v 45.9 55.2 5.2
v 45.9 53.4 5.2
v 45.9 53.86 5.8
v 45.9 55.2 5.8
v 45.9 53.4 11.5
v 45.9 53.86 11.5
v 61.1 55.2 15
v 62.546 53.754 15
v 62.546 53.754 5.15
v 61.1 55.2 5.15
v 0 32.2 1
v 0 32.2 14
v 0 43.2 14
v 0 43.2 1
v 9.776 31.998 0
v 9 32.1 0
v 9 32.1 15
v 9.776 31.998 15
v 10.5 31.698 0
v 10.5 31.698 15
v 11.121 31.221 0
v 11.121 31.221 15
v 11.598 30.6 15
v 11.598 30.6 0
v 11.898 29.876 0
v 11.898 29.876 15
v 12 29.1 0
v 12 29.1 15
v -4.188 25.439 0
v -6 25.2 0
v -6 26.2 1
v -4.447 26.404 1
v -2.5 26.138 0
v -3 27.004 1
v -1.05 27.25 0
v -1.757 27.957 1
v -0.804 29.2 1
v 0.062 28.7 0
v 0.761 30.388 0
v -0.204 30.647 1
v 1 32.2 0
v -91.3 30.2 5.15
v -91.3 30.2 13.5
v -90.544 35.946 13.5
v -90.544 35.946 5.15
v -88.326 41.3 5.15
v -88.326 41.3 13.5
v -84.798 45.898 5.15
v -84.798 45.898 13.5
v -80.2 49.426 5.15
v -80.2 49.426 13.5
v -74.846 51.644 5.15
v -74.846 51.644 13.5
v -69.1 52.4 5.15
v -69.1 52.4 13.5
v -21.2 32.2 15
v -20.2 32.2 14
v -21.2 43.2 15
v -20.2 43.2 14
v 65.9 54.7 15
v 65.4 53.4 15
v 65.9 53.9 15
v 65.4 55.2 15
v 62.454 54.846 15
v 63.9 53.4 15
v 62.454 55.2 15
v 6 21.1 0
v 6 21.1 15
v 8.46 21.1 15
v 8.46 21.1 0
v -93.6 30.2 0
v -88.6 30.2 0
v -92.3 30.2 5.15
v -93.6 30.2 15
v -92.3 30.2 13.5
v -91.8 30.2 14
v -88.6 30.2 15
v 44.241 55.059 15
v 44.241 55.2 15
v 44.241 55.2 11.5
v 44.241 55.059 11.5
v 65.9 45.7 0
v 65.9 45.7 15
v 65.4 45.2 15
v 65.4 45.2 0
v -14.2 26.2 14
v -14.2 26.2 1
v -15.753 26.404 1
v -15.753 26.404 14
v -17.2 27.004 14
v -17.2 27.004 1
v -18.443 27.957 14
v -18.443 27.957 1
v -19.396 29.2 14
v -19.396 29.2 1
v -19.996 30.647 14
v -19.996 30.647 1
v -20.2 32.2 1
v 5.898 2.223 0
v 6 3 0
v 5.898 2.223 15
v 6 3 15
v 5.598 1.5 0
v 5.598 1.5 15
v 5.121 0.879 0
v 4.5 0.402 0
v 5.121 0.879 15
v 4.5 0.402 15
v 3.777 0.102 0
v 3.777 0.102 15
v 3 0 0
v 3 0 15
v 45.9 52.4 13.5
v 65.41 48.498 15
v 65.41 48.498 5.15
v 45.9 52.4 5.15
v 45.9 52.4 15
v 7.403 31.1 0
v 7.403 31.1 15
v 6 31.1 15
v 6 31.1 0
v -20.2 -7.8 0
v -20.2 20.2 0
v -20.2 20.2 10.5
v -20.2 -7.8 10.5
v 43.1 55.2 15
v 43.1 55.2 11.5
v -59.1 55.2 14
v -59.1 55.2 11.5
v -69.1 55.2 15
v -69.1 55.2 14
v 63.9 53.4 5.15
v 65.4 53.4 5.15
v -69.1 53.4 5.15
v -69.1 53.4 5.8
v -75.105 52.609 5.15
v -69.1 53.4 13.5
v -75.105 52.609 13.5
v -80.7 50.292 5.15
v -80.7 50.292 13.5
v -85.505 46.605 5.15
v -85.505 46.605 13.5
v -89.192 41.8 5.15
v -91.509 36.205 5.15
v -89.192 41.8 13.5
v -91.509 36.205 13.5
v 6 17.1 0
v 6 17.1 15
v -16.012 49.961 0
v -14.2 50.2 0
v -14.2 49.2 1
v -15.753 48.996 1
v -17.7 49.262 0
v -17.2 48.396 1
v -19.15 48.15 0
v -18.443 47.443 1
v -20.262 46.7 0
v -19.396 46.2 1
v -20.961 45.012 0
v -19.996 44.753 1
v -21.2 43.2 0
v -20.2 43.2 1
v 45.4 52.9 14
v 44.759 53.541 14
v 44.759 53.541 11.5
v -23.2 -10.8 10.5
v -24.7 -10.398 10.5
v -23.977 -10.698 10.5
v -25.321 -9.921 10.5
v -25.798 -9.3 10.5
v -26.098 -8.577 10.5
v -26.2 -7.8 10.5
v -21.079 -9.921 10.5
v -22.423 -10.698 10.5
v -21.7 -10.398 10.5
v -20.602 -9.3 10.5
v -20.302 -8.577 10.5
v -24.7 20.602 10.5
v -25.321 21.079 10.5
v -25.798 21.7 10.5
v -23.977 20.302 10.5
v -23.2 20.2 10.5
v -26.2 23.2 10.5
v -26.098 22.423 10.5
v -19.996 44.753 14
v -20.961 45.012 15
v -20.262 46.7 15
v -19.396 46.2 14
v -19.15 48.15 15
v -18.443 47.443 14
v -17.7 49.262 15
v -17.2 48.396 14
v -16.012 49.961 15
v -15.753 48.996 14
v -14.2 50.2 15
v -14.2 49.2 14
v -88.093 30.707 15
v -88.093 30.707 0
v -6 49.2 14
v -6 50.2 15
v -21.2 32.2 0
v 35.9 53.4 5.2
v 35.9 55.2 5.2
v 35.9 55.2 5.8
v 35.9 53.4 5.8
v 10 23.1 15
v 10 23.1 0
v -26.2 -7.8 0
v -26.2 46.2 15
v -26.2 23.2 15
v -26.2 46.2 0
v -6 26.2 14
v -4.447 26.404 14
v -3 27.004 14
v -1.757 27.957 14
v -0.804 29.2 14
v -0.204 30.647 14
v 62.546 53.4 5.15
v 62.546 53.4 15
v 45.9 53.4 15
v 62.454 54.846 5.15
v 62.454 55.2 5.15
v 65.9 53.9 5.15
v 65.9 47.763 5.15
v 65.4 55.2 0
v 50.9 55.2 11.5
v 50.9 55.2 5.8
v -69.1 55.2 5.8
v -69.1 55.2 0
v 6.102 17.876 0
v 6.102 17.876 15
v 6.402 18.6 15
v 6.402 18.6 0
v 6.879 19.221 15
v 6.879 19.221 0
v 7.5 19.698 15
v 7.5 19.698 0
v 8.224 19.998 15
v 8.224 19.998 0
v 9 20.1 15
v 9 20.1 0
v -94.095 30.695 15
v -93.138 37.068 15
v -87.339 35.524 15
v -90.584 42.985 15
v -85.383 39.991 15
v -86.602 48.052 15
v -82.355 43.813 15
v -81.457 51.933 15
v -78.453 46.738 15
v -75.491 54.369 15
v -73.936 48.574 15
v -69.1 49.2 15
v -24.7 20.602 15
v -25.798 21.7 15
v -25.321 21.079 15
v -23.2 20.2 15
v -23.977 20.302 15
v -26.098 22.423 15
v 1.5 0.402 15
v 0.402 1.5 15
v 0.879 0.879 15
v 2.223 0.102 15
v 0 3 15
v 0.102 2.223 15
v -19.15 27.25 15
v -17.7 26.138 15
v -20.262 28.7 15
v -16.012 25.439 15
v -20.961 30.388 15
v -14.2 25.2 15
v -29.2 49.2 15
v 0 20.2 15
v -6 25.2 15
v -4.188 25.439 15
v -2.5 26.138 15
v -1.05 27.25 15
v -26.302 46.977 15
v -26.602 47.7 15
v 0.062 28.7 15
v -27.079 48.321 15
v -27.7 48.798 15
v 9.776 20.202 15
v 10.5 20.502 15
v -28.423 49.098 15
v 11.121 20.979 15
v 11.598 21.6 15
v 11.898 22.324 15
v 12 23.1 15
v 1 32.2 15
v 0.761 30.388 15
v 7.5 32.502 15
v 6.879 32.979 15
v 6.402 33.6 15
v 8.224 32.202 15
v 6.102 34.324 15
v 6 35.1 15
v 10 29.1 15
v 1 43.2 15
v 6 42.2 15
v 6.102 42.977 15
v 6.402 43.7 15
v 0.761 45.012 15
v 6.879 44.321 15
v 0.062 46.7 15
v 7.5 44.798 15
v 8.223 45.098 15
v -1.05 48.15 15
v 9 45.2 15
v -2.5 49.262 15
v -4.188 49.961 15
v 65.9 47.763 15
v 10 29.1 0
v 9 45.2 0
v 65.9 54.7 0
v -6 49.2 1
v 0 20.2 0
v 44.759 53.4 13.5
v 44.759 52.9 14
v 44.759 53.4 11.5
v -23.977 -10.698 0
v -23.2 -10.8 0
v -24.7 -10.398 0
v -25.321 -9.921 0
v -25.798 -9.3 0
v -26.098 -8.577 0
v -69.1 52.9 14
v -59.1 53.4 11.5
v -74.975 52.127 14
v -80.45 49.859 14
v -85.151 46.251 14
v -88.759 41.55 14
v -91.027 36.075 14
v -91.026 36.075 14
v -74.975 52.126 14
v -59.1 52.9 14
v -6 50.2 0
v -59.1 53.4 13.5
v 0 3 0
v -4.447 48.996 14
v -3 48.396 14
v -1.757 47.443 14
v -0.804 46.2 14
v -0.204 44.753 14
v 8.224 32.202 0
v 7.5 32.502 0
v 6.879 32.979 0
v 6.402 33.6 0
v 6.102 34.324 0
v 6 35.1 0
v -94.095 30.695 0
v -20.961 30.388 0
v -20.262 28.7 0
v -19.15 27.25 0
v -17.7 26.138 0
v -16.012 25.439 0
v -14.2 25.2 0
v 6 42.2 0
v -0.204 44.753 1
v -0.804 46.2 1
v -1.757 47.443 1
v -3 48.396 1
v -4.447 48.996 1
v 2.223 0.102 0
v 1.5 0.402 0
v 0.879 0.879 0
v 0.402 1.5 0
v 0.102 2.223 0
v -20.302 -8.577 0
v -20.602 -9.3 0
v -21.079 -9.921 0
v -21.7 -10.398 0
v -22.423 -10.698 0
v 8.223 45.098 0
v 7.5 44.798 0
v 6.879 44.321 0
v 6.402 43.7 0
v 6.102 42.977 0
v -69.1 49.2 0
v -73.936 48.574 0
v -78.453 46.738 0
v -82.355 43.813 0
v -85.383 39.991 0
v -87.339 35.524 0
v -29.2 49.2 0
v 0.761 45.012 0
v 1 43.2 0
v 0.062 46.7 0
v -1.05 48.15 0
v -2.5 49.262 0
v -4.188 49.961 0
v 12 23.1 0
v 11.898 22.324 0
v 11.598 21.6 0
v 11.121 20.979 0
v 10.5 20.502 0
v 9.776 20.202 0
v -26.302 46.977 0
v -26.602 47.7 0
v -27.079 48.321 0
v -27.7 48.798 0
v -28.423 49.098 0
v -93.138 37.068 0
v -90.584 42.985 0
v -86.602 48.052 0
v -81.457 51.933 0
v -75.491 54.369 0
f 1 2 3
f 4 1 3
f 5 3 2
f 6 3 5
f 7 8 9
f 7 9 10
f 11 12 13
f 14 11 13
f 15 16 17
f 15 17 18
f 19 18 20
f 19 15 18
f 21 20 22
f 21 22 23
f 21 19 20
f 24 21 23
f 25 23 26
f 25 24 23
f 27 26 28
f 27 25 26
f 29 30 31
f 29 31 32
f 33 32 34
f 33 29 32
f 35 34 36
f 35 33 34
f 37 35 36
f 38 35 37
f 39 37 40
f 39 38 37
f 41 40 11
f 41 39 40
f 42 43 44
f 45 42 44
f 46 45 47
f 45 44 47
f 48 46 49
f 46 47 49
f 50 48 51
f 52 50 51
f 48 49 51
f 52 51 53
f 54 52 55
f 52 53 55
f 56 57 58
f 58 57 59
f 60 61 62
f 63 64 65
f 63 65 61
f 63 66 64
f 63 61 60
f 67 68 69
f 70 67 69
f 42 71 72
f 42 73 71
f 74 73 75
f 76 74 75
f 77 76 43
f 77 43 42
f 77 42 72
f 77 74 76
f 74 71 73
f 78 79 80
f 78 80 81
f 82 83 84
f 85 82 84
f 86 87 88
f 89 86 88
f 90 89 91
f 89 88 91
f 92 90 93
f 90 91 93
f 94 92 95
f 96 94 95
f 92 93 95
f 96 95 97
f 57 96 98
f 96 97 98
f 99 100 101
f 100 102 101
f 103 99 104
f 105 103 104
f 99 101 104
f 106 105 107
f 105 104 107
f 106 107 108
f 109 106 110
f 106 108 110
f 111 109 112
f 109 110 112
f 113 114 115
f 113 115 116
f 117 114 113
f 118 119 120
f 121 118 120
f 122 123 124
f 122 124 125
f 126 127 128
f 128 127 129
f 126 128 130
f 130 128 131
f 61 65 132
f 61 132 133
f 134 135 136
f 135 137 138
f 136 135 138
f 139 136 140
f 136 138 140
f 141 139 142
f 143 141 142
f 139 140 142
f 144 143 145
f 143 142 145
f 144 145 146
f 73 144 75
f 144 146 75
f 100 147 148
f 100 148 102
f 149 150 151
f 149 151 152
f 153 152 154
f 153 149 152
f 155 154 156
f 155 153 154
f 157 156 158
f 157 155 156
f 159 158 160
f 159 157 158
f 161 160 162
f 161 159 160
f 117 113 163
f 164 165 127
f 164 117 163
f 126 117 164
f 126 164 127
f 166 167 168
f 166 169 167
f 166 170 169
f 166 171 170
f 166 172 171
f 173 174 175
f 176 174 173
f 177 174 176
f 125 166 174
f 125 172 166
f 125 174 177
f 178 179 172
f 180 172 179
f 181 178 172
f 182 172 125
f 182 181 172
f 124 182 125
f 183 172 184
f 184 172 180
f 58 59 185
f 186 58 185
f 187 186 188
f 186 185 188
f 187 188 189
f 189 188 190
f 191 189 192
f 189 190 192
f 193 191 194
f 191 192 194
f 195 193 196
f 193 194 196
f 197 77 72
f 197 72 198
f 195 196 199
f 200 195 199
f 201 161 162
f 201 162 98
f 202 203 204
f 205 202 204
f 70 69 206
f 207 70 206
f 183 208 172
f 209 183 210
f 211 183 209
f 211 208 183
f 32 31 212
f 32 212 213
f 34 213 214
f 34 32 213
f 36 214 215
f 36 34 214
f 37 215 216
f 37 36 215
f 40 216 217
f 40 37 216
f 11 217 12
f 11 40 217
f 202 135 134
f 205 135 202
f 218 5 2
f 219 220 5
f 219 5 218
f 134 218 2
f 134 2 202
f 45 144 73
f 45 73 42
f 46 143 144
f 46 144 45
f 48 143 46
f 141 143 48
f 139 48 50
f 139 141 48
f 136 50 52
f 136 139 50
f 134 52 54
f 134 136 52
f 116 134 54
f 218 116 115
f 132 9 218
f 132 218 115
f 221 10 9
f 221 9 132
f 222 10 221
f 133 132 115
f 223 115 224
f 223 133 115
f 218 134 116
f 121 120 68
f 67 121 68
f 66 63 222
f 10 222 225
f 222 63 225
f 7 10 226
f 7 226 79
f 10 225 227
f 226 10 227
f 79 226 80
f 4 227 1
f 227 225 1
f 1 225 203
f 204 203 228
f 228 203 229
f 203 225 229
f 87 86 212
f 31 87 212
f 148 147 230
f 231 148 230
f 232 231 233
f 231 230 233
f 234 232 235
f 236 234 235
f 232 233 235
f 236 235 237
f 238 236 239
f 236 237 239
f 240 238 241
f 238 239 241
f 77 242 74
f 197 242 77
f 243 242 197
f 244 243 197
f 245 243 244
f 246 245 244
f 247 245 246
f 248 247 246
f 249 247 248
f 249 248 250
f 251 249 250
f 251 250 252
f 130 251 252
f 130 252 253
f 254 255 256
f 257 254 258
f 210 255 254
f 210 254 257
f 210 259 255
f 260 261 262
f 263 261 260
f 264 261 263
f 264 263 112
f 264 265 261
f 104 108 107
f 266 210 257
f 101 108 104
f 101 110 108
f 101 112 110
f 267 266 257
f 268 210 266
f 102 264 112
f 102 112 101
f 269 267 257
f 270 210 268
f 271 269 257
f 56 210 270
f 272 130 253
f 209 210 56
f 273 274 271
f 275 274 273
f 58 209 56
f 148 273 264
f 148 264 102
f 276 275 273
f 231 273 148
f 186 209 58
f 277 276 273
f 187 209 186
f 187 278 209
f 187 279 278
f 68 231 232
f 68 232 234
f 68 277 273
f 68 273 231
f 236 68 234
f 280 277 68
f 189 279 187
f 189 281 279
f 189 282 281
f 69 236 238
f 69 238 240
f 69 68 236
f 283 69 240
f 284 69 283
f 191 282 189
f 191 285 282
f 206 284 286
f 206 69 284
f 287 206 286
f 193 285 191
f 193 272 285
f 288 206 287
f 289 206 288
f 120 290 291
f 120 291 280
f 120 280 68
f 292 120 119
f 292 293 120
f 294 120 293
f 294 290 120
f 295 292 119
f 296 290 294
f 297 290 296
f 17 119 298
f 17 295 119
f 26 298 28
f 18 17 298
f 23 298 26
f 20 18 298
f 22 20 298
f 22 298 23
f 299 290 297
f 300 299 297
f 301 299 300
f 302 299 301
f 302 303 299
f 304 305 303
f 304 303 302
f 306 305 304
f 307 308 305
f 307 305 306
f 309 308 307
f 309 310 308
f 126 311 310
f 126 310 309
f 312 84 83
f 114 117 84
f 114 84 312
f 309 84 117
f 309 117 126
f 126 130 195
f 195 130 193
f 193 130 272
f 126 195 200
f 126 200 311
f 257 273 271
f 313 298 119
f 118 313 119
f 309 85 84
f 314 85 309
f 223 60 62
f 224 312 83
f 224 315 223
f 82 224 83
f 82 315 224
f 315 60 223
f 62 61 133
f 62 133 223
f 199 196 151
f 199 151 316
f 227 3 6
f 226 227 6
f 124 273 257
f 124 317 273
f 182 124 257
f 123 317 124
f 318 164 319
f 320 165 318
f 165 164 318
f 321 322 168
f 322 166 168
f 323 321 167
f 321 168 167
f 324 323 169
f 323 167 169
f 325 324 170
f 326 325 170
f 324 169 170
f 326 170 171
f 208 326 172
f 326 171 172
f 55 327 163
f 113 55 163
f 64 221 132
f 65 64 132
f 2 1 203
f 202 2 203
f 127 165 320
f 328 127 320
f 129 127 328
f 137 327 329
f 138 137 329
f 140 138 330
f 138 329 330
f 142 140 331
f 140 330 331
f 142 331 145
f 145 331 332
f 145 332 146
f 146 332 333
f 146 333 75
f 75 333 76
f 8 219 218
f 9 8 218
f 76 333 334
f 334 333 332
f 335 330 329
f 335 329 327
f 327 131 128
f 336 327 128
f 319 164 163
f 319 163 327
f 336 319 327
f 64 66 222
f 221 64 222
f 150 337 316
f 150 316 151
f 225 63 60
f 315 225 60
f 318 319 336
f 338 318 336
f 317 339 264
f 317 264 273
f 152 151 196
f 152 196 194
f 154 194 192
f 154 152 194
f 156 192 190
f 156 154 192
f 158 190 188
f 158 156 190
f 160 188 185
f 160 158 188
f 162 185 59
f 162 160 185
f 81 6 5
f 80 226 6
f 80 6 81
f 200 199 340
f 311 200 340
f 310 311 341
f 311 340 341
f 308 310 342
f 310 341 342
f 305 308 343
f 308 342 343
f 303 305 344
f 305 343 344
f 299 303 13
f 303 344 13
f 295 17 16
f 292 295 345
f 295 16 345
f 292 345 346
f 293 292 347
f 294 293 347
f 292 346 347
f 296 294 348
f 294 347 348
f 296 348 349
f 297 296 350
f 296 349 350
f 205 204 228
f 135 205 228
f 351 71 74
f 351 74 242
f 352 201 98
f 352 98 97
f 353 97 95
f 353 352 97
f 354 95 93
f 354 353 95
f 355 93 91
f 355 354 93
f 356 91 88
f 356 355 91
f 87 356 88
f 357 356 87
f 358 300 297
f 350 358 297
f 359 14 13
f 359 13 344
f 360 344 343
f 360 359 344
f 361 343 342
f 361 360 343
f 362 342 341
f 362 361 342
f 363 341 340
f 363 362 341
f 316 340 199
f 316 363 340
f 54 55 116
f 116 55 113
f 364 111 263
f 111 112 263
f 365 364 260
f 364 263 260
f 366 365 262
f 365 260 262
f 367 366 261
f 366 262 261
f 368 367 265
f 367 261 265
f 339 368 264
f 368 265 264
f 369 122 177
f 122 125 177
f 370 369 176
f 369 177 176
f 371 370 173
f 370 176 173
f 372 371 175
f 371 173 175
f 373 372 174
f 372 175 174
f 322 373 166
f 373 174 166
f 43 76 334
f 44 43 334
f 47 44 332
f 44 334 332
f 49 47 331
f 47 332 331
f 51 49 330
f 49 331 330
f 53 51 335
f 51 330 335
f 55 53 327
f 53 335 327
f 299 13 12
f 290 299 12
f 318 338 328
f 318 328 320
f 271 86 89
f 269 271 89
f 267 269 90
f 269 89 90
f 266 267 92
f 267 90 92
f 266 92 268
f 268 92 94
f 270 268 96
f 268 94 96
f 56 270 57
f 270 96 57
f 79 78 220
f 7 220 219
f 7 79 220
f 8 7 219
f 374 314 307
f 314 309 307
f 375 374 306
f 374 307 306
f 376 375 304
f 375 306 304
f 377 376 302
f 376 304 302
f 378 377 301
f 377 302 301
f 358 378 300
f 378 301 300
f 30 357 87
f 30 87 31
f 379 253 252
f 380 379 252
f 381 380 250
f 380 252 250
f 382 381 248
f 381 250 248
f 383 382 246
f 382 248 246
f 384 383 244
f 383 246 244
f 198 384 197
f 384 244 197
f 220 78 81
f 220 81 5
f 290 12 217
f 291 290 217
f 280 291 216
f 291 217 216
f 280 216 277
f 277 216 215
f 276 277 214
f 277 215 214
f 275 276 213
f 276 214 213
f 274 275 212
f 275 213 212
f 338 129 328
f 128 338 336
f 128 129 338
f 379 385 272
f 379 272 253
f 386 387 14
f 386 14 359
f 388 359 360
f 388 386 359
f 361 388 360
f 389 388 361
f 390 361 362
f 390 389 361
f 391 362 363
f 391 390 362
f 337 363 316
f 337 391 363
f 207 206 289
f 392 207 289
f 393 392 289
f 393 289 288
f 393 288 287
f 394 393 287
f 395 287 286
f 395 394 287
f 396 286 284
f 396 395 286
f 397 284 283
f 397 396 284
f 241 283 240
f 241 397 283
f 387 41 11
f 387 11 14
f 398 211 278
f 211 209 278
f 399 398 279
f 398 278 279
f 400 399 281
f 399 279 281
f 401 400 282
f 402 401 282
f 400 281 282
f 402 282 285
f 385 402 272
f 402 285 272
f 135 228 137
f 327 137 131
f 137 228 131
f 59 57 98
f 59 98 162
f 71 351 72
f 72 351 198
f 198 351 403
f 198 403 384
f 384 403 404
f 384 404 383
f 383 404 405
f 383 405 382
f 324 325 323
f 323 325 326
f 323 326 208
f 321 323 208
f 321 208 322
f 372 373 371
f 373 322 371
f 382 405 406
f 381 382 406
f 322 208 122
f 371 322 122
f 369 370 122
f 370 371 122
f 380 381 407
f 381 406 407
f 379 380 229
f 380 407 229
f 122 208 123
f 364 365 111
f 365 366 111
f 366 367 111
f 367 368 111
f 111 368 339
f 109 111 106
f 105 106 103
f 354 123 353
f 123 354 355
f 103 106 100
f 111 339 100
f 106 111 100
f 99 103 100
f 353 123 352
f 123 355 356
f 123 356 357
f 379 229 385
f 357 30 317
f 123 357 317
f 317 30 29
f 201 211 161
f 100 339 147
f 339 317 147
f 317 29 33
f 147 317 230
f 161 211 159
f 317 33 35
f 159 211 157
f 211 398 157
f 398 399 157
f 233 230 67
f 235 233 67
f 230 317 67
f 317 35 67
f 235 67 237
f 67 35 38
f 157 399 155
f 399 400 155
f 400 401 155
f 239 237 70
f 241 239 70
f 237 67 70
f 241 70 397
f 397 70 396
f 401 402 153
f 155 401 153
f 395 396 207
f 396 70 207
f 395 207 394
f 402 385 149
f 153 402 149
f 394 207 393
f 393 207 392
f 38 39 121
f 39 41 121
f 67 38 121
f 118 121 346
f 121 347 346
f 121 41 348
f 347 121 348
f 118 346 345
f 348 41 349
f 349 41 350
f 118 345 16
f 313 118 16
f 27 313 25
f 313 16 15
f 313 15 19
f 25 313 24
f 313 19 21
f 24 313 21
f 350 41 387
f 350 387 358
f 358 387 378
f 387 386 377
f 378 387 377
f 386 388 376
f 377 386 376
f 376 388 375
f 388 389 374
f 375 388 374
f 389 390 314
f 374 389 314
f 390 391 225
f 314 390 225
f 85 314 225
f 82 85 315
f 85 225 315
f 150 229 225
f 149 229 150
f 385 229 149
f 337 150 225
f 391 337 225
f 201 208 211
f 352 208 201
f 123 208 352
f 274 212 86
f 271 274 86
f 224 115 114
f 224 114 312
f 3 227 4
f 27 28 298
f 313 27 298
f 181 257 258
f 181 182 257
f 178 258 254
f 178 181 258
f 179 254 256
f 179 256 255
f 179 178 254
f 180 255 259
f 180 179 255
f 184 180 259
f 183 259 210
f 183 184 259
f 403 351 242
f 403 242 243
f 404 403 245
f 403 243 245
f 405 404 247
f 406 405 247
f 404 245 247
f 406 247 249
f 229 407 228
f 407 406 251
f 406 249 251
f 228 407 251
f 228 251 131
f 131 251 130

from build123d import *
from OCP.BRepFilletAPI import BRepFilletAPI_MakeChamfer

# Parameters (mm, degrees)
BOSS_EXTRUDE1_DEPTH = 15
BOSS_EXTRUDE2_DEPTH = 15
SKETCH6_W           = 115
SKETCH6_H           = 1
CUT_EXTRUDE2_DEPTH  = 9.85
CUT_EXTRUDE3_DEPTH  = 9.85
CUT_EXTRUDE4_DEPTH  = 9.85
BOSS_EXTRUDE3_DEPTH = 1
CUT_EXTRUDE5_REACH  = 117.913
SKETCH10_W          = 115
SKETCH10_H          = 5.7
SKETCH13_W          = 20.2
SKETCH13_H          = 23
CUT_EXTRUDE6_DEPTH  = 111.121977825
FILLET1_R           = 6
SKETCH14_W          = 6
SKETCH14_H          = 31
CUT_EXTRUDE7_DEPTH  = 4.5
FILLET2_R           = 3
SKETCH16_W          = 10
SKETCH16_H          = 2.5
CUT_EXTRUDE8_DEPTH  = 1.8
CHAMFER1_SIZE       = 0.5
CHAMFER1_SIZE_2     = 0.637377439
CHAMFER2_SIZE       = 1
CHAMFER3_SIZE       = 5
CHAMFER3_SIZE2      = 1.339745962
CUT_EXTRUDE12_REACH = 112.118
CHAMFER4_SIZE       = 0.2
CHAMFER4_SIZE_2     = 0.141421356
SKETCH25_W          = 6
SKETCH25_H          = 12
BOSS_EXTRUDE6_DEPTH = 15
FILLET4_START       = -1
FILLET4_DEPTH       = 16
FILLET4_2_DEPTH     = 15
CUT_EXTRUDE15_DEPTH = 15
CUT_EXTRUDE16_DEPTH = 9.85
CHAMFER5_SIZE       = 0.5
CHAMFER5_SIZE2      = 0.353553391
CHAMFER6_SIZE       = 0.5
SKETCH29_W          = 10
SKETCH29_H          = 0.6
CUT_EXTRUDE17_DEPTH = 2.8


with BuildPart() as part:
    # Sketch3 → Boss-Extrude1 (new body)
    with BuildSketch(Plane.XY):
        Polygon((0, 0), (0, 20.2), (-20.2, 20.2), (-20.2, -10.8), (-26.2, -10.8), (-26.2, 49.2), (-69.1, 49.2), (-69.1, 55.2), (5.9, 55.2), (65.9, 55.2), (65.9, 45.2), (6, 45.2), (6, 0), align=None)
    extrude(amount=BOSS_EXTRUDE1_DEPTH)

    # Sketch4 → Boss-Extrude2 (add)
    with BuildSketch(Plane.XY.offset(15)):
        with BuildLine():
            Line((-88.1, 30.2), (-94.1, 30.2))
            ThreePointArc((-94.1, 30.2), (-86.77766953, 47.87766953), (-69.1, 55.2))
            Line((-69.1, 55.2), (-69.1, 49.2))
            ThreePointArc((-69.1, 49.2), (-82.535028843, 43.635028843), (-88.1, 30.2))
        make_face()
    extrude(amount=-BOSS_EXTRUDE2_DEPTH)

    # Sketch6 → Cut-Extrude2 (cut)
    with BuildSketch(Plane.XY.offset(15)):
        with Locations((-11.6, 52.9)):
            Rectangle(SKETCH6_W, SKETCH6_H)
    extrude(amount=-CUT_EXTRUDE2_DEPTH, mode=Mode.SUBTRACT)

    # Sketch7 → Cut-Extrude3 (cut)
    with BuildSketch(Plane.XY.offset(15)):
        with BuildLine():
            Line((-92.3, 30.2), (-91.3, 30.2))
            ThreePointArc((-91.3, 30.2), (-84.797770542, 45.897770542), (-69.1, 52.4))
            Line((-69.1, 52.4), (-69.1, 53.4))
            ThreePointArc((-69.1, 53.4), (-85.504877324, 46.604877324), (-92.3, 30.2))
        make_face()
    extrude(amount=-CUT_EXTRUDE3_DEPTH, mode=Mode.SUBTRACT)

    # Sketch8 → Cut-Extrude4 (cut)
    with BuildSketch(Plane.XY.offset(15)):
        Polygon((45.9, 53.4), (65.9, 53.4), (65.9, 48.4), (45.9, 52.4), align=None)
    extrude(amount=-CUT_EXTRUDE4_DEPTH, mode=Mode.SUBTRACT)

    # Sketch9 → Boss-Extrude3 (add)
    with BuildSketch(Plane.XY.offset(15)):
        with BuildLine():
            Line((-69.1, 52.4), (45.9, 52.4))
            Line((45.9, 52.4), (45.9, 53.4))
            Line((45.9, 53.4), (-69.1, 53.4))
            ThreePointArc((-69.1, 53.4), (-85.504877324, 46.604877324), (-92.3, 30.2))
            Line((-92.3, 30.2), (-91.3, 30.2))
            ThreePointArc((-91.3, 30.2), (-84.797770542, 45.897770542), (-69.1, 52.4))
        make_face()
    extrude(amount=-BOSS_EXTRUDE3_DEPTH)

    # Cut-Extrude5: up to this face of the body (flat: up to its plane)
    cut_extrude5_end = Plane(part.part.faces().sort_by_distance((-11.6, 52.4, 9.575))[0])
    # Sketch10 → Cut-Extrude5 (cut, up to the picked face)
    with BuildSketch(Plane(origin=(0, 55.2, 0), x_dir=(-1, 0, 0), z_dir=(0, 1, 0)), mode=Mode.PRIVATE) as cut_extrude5_sk1:
        with Locations((11.6, 8.65)):
            Rectangle(SKETCH10_W, SKETCH10_H)
    cut_extrude5_tool1 = split(extrude(cut_extrude5_sk1.sketch, amount=-CUT_EXTRUDE5_REACH, mode=Mode.PRIVATE), bisect_by=cut_extrude5_end, keep=Keep.BOTH, mode=Mode.PRIVATE)
    add(cut_extrude5_tool1.solids().sort_by(Axis((-11.6, 55.2, 8.65), (0, -1, 0)))[0], mode=Mode.SUBTRACT)

    # Sketch13 → Cut-Extrude6 (cut, through all)
    with BuildSketch(Plane.XY.offset(15)):
        with Locations((-10.1, 37.7)):
            Rectangle(SKETCH13_W, SKETCH13_H)
    extrude(amount=-CUT_EXTRUDE6_DEPTH, mode=Mode.SUBTRACT)

    # Fillet1
    fillet1_edges = [part.edges().sort_by_distance(p)[0] for p in [
        (-20.2, 26.2, 7.5),
        (-20.2, 49.2, 7.5),
        (0, 49.2, 7.5),
        (0, 26.2, 7.5),
    ]]
    fillet(fillet1_edges, radius=FILLET1_R)

    # Sketch14 → Cut-Extrude7 (cut)
    with BuildSketch(Plane.XY.offset(15)):
        with Locations((-23.2, 4.7)):
            Rectangle(SKETCH14_W, SKETCH14_H)
    extrude(amount=-CUT_EXTRUDE7_DEPTH, mode=Mode.SUBTRACT)

    # Fillet2
    fillet2_edges = [part.edges().sort_by_distance(p)[0] for p in [
        (-26.2, 49.2, 7.5),
        (6, 45.2, 7.5),
        (-26.2, 20.2, 12.75),
        (6, 0, 7.5),
        (0, 0, 7.5),
        (-20.2, -10.8, 5.25),
        (-26.2, -10.8, 5.25),
    ]]
    fillet(fillet2_edges, radius=FILLET2_R - 0.0001)  # a hair under: the kernel refuses the full size

    # Sketch16 → Cut-Extrude8 (cut)
    with BuildSketch(Plane(origin=(0, 55.2, 0), x_dir=(-1, 0, 0), z_dir=(0, 1, 0))):
        with Locations((64.1, 12.75)):
            Rectangle(SKETCH16_W, SKETCH16_H)
    extrude(amount=-CUT_EXTRUDE8_DEPTH, mode=Mode.SUBTRACT)

    # Chamfer1
    # the kernel refuses this chamfer: 0.637377439, 0.5 mm, written as the material it takes off along each edge
    with BuildSketch(Plane(origin=(65.9, 55.2, -1.285841494), x_dir=(-1, 0, 0), z_dir=(0, 0, 1)), Plane(origin=(65.9, 45.2, -1.285841494), x_dir=(0, 1, 0), z_dir=(0, 0, 1))) as chamfer1_piece_1:
        Polygon((CHAMFER1_SIZE, 0), (0, CHAMFER1_SIZE), (0, 0), align=None)
    extrude(amount=17.571682988, mode=Mode.SUBTRACT)
    with BuildSketch(Plane(origin=(-88.1, 30.2, 16.303301327), x_dir=(-1, 0, 0), z_dir=(0, 0, -1))) as chamfer1_piece_2:
        with BuildLine():
            Line((CHAMFER1_SIZE, 0), (-0.006759226, 0.506759226))
            ThreePointArc((-0.006759226, 0.506759226), (-0.001786833, 0.26056951), (0, 0))
            Line((0, 0), (CHAMFER1_SIZE, 0))
        make_face()
    extrude(amount=17.606602654, mode=Mode.SUBTRACT)
    with BuildSketch(Plane(origin=(-94.1, 30.2, 16.285841494), x_dir=(1, 0, 0), z_dir=(0, 0, -1))) as chamfer1_piece_3:
        with BuildLine():
            Line((CHAMFER1_SIZE, 0), (0.004902903, -0.495097097))
            ThreePointArc((0.004902903, -0.495097097), (0.001296043, -0.254559377), (0, 0))
            Line((0, 0), (CHAMFER1_SIZE, 0))
        make_face()
    extrude(amount=17.571682988, mode=Mode.SUBTRACT)
    with BuildSketch(Plane(origin=(65.9, 53.4, 16.285841494), x_dir=(-1, 0, 0), z_dir=(0, 0, -1))) as chamfer1_piece_4:
        Polygon((CHAMFER1_SIZE, 0), (0, CHAMFER1_SIZE), (0, 0), align=None)
    extrude(amount=11.135841494, mode=Mode.SUBTRACT)
    with BuildSketch(Plane(origin=(65.9, 48.4, 16.646856161), x_dir=(-0.9805806756909208, 0.1961161351381813, 0), z_dir=(0, 0, -1))) as chamfer1_piece_5:
        Polygon((CHAMFER1_SIZE, 0), (-CHAMFER1_SIZE_2 * 0.196116135199, -CHAMFER1_SIZE_2 * 0.980580675997), (0, 0), align=None)
    extrude(amount=11.496856161, mode=Mode.SUBTRACT)

    # Chamfer2
    chamfer2_edges = [part.edges().sort_by_distance(p)[0] for p in [
        (-10.1, 49.2, 15),
        (-10.1, 49.2, 0),
        (0, 37.7, 15),
        (0, 37.7, 0),
        (-10.1, 26.2, 15),
        (-10.1, 26.2, 0),
        (-20.2, 37.7, 15),
        (-20.2, 37.7, 0),
        (-1.757359313, 47.442640687, 15),
        (-1.757359313, 47.442640687, 0),
        (-1.757359313, 27.957359313, 15),
        (-1.757359313, 27.957359313, 0),
        (-18.442640687, 27.957359313, 15),
        (-18.442640687, 27.957359313, 0),
        (-18.442640687, 47.442640687, 15),
        (-18.442640687, 47.442640687, 0),
    ]]
    chamfer(chamfer2_edges, length=CHAMFER2_SIZE)

    # Chamfer3
    chamfer3_edges = [part.edges().sort_by_distance(p)[0] for p in [
        (45.9, 55.2, 8.65),
    ]]
    chamfer3_side = [part.faces().sort_by_distance(p)[0] for p in [
        (64.046661535, 55.2, 7.5),
    ]]
    chamfer(chamfer3_edges, length=CHAMFER3_SIZE, length2=CHAMFER3_SIZE2, reference=chamfer3_side[0])

    # Cut-Extrude12: up to this face of the body (flat: up to its plane)
    cut_extrude12_end = Plane(part.part.faces().sort_by_distance((-5.656799941, 54.307895333, 11.5))[0])
    # Sketch20 → Cut-Extrude12 (cut, up to the picked face)
    with BuildSketch(Plane.XY.offset(15), mode=Mode.PRIVATE) as cut_extrude12_sk1:
        Polygon((45.9, 52.4), (43.1, 55.2), (44.1, 55.2), (45.9, 53.4), align=None)
    cut_extrude12_tool1 = split(extrude(cut_extrude12_sk1.sketch, amount=-CUT_EXTRUDE12_REACH, mode=Mode.PRIVATE), bisect_by=cut_extrude12_end, keep=Keep.BOTH, mode=Mode.PRIVATE)
    add(cut_extrude12_tool1.solids().sort_by(Axis((44.731884, 54.031884, 15), (0, 0, -1)))[0], mode=Mode.SUBTRACT)

    # Chamfer4
    # the kernel refuses this chamfer: 0.2, 0.141421356 mm, written as the material it takes off along each edge
    with BuildSketch(Plane(origin=(44.9, 53.4, 10.985663402), x_dir=(-0.7071067811865297, 0.7071067811865652, 0), z_dir=(0, 0, 1))) as chamfer4_piece_1:
        Polygon((CHAMFER4_SIZE, 0), (CHAMFER4_SIZE_2 * 0.707106782373, CHAMFER4_SIZE_2 * 0.707106782373), (0, 0), align=None)
    extrude(amount=3.014336598, mode=Mode.SUBTRACT)
    with BuildSketch(Plane(origin=(44.1, 55.2, 15.514336598), x_dir=(1, 0, 0), z_dir=(0, 0, -1))) as chamfer4_piece_2:
        Polygon((CHAMFER4_SIZE_2 * 1.00000000168, 0), (CHAMFER4_SIZE * 0.707106781187, CHAMFER4_SIZE * 0.707106781186), (0, 0), align=None)
    extrude(amount=4.528673195, mode=Mode.SUBTRACT)

    # Sketch25 → Boss-Extrude6 (add)
    with BuildSketch(Plane.XY.offset(15)):
        with Locations((9, 26.1)):
            Rectangle(SKETCH25_W, SKETCH25_H)
    extrude(amount=-BOSS_EXTRUDE6_DEPTH)

    # Fillet4: read off the stored shape, not the designer's step
    # Fillet4 outline → Fillet4 (cut)
    with BuildSketch(Plane.XY.offset(FILLET4_START)):
        with BuildLine():
            ThreePointArc((9, 32.1), (11.121320344, 31.221320344), (12, 29.1))
            Line((12, 29.1), (12, 32.1))
            Line((12, 32.1), (9, 32.1))
        make_face()
        with BuildLine():
            ThreePointArc((12, 23.1), (11.121320344, 20.978679656), (9, 20.1))
            Line((9, 20.1), (12, 20.1))
            Line((12, 20.1), (12, 23.1))
        make_face()
    extrude(amount=FILLET4_DEPTH, mode=Mode.SUBTRACT)

    # Fillet4 2 outline → Fillet4 2 (add)
    with BuildSketch(Plane.XY):
        with BuildLine():
            Line((6, 32.1), (9, 32.1))
            ThreePointArc((9, 32.1), (6.878679656, 32.978679656), (6, 35.1))
            Line((6, 35.1), (6, 32.1))
        make_face()
        with BuildLine():
            ThreePointArc((6, 17.1), (6.878679656, 19.221320344), (9, 20.1))
            Line((9, 20.1), (6, 20.1))
            Line((6, 20.1), (6, 17.1))
        make_face()
    extrude(amount=FILLET4_2_DEPTH)

    # Sketch26 → Cut-Extrude15 (cut)
    with BuildSketch(Plane.XY.offset(15)):
        Polygon((12, 29.1), (10, 29.1), (7.402667467, 31.1), (6, 31.1), (6, 21.1), (8.459958458, 21.1), (10, 23.1), (12, 23.1), align=None)
    extrude(amount=-CUT_EXTRUDE15_DEPTH, mode=Mode.SUBTRACT)

    # Sketch27 → Cut-Extrude16 (cut)
    with BuildSketch(Plane.XY.offset(15)):
        Polygon((62.9, 53.4), (61.1, 55.2), (62.1, 55.2), (63.9, 53.4), align=None)
    extrude(amount=-CUT_EXTRUDE16_DEPTH, mode=Mode.SUBTRACT)

    # Chamfer5: one chamfer whose edges measure the first distance from different faces: ONE call of the kernel's chamfer builder (chamfer() names one face for all edges)
    chamfer5_edges_1 = [part.edges().sort_by_distance(p)[0] for p in [
        (62.9, 53.4, 10.075),
    ]]
    chamfer5_side_1 = [part.faces().sort_by_distance(p)[0] for p in [
        (62, 54.3, 10.075),
    ]]
    chamfer5_edges_2 = [part.edges().sort_by_distance(p)[0] for p in [
        (62.1, 55.2, 10.075),
    ]]
    chamfer5_side_2 = [part.faces().sort_by_distance(p)[0] for p in [
        (63, 54.3, 10.075),
    ]]
    chamfer5 = BRepFilletAPI_MakeChamfer(part.part.solid().wrapped)
    for e in chamfer5_edges_1:
        chamfer5.Add(CHAMFER5_SIZE, CHAMFER5_SIZE2, e.wrapped, chamfer5_side_1[0].wrapped)  # the first distance lies on this face
    for e in chamfer5_edges_2:
        chamfer5.Add(CHAMFER5_SIZE, CHAMFER5_SIZE2, e.wrapped, chamfer5_side_2[0].wrapped)  # the first distance lies on this face
    add(Compound.cast(chamfer5.Shape()), mode=Mode.REPLACE)

    # Chamfer6
    chamfer6_edges = [part.edges().sort_by_distance(p)[0] for p in [
        (-7.170710678, 53.4, 14),
        (-11.6, 52.4, 14),
        (-84.797770542, 45.897770542, 14),
        (-85.504877324, 46.604877324, 14),
    ]]
    chamfer(chamfer6_edges, length=CHAMFER6_SIZE - 0.0001)  # a hair under: the kernel refuses the full size

    # Sketch29 → Cut-Extrude17 (cut)
    with BuildSketch(Plane(origin=(0, 55.2, 0), x_dir=(-1, 0, 0), z_dir=(0, 1, 0))):
        with Locations((-40.9, 5.5)):
            Rectangle(SKETCH29_W, SKETCH29_H)
    extrude(amount=-CUT_EXTRUDE17_DEPTH, mode=Mode.SUBTRACT)


solid = part.part
